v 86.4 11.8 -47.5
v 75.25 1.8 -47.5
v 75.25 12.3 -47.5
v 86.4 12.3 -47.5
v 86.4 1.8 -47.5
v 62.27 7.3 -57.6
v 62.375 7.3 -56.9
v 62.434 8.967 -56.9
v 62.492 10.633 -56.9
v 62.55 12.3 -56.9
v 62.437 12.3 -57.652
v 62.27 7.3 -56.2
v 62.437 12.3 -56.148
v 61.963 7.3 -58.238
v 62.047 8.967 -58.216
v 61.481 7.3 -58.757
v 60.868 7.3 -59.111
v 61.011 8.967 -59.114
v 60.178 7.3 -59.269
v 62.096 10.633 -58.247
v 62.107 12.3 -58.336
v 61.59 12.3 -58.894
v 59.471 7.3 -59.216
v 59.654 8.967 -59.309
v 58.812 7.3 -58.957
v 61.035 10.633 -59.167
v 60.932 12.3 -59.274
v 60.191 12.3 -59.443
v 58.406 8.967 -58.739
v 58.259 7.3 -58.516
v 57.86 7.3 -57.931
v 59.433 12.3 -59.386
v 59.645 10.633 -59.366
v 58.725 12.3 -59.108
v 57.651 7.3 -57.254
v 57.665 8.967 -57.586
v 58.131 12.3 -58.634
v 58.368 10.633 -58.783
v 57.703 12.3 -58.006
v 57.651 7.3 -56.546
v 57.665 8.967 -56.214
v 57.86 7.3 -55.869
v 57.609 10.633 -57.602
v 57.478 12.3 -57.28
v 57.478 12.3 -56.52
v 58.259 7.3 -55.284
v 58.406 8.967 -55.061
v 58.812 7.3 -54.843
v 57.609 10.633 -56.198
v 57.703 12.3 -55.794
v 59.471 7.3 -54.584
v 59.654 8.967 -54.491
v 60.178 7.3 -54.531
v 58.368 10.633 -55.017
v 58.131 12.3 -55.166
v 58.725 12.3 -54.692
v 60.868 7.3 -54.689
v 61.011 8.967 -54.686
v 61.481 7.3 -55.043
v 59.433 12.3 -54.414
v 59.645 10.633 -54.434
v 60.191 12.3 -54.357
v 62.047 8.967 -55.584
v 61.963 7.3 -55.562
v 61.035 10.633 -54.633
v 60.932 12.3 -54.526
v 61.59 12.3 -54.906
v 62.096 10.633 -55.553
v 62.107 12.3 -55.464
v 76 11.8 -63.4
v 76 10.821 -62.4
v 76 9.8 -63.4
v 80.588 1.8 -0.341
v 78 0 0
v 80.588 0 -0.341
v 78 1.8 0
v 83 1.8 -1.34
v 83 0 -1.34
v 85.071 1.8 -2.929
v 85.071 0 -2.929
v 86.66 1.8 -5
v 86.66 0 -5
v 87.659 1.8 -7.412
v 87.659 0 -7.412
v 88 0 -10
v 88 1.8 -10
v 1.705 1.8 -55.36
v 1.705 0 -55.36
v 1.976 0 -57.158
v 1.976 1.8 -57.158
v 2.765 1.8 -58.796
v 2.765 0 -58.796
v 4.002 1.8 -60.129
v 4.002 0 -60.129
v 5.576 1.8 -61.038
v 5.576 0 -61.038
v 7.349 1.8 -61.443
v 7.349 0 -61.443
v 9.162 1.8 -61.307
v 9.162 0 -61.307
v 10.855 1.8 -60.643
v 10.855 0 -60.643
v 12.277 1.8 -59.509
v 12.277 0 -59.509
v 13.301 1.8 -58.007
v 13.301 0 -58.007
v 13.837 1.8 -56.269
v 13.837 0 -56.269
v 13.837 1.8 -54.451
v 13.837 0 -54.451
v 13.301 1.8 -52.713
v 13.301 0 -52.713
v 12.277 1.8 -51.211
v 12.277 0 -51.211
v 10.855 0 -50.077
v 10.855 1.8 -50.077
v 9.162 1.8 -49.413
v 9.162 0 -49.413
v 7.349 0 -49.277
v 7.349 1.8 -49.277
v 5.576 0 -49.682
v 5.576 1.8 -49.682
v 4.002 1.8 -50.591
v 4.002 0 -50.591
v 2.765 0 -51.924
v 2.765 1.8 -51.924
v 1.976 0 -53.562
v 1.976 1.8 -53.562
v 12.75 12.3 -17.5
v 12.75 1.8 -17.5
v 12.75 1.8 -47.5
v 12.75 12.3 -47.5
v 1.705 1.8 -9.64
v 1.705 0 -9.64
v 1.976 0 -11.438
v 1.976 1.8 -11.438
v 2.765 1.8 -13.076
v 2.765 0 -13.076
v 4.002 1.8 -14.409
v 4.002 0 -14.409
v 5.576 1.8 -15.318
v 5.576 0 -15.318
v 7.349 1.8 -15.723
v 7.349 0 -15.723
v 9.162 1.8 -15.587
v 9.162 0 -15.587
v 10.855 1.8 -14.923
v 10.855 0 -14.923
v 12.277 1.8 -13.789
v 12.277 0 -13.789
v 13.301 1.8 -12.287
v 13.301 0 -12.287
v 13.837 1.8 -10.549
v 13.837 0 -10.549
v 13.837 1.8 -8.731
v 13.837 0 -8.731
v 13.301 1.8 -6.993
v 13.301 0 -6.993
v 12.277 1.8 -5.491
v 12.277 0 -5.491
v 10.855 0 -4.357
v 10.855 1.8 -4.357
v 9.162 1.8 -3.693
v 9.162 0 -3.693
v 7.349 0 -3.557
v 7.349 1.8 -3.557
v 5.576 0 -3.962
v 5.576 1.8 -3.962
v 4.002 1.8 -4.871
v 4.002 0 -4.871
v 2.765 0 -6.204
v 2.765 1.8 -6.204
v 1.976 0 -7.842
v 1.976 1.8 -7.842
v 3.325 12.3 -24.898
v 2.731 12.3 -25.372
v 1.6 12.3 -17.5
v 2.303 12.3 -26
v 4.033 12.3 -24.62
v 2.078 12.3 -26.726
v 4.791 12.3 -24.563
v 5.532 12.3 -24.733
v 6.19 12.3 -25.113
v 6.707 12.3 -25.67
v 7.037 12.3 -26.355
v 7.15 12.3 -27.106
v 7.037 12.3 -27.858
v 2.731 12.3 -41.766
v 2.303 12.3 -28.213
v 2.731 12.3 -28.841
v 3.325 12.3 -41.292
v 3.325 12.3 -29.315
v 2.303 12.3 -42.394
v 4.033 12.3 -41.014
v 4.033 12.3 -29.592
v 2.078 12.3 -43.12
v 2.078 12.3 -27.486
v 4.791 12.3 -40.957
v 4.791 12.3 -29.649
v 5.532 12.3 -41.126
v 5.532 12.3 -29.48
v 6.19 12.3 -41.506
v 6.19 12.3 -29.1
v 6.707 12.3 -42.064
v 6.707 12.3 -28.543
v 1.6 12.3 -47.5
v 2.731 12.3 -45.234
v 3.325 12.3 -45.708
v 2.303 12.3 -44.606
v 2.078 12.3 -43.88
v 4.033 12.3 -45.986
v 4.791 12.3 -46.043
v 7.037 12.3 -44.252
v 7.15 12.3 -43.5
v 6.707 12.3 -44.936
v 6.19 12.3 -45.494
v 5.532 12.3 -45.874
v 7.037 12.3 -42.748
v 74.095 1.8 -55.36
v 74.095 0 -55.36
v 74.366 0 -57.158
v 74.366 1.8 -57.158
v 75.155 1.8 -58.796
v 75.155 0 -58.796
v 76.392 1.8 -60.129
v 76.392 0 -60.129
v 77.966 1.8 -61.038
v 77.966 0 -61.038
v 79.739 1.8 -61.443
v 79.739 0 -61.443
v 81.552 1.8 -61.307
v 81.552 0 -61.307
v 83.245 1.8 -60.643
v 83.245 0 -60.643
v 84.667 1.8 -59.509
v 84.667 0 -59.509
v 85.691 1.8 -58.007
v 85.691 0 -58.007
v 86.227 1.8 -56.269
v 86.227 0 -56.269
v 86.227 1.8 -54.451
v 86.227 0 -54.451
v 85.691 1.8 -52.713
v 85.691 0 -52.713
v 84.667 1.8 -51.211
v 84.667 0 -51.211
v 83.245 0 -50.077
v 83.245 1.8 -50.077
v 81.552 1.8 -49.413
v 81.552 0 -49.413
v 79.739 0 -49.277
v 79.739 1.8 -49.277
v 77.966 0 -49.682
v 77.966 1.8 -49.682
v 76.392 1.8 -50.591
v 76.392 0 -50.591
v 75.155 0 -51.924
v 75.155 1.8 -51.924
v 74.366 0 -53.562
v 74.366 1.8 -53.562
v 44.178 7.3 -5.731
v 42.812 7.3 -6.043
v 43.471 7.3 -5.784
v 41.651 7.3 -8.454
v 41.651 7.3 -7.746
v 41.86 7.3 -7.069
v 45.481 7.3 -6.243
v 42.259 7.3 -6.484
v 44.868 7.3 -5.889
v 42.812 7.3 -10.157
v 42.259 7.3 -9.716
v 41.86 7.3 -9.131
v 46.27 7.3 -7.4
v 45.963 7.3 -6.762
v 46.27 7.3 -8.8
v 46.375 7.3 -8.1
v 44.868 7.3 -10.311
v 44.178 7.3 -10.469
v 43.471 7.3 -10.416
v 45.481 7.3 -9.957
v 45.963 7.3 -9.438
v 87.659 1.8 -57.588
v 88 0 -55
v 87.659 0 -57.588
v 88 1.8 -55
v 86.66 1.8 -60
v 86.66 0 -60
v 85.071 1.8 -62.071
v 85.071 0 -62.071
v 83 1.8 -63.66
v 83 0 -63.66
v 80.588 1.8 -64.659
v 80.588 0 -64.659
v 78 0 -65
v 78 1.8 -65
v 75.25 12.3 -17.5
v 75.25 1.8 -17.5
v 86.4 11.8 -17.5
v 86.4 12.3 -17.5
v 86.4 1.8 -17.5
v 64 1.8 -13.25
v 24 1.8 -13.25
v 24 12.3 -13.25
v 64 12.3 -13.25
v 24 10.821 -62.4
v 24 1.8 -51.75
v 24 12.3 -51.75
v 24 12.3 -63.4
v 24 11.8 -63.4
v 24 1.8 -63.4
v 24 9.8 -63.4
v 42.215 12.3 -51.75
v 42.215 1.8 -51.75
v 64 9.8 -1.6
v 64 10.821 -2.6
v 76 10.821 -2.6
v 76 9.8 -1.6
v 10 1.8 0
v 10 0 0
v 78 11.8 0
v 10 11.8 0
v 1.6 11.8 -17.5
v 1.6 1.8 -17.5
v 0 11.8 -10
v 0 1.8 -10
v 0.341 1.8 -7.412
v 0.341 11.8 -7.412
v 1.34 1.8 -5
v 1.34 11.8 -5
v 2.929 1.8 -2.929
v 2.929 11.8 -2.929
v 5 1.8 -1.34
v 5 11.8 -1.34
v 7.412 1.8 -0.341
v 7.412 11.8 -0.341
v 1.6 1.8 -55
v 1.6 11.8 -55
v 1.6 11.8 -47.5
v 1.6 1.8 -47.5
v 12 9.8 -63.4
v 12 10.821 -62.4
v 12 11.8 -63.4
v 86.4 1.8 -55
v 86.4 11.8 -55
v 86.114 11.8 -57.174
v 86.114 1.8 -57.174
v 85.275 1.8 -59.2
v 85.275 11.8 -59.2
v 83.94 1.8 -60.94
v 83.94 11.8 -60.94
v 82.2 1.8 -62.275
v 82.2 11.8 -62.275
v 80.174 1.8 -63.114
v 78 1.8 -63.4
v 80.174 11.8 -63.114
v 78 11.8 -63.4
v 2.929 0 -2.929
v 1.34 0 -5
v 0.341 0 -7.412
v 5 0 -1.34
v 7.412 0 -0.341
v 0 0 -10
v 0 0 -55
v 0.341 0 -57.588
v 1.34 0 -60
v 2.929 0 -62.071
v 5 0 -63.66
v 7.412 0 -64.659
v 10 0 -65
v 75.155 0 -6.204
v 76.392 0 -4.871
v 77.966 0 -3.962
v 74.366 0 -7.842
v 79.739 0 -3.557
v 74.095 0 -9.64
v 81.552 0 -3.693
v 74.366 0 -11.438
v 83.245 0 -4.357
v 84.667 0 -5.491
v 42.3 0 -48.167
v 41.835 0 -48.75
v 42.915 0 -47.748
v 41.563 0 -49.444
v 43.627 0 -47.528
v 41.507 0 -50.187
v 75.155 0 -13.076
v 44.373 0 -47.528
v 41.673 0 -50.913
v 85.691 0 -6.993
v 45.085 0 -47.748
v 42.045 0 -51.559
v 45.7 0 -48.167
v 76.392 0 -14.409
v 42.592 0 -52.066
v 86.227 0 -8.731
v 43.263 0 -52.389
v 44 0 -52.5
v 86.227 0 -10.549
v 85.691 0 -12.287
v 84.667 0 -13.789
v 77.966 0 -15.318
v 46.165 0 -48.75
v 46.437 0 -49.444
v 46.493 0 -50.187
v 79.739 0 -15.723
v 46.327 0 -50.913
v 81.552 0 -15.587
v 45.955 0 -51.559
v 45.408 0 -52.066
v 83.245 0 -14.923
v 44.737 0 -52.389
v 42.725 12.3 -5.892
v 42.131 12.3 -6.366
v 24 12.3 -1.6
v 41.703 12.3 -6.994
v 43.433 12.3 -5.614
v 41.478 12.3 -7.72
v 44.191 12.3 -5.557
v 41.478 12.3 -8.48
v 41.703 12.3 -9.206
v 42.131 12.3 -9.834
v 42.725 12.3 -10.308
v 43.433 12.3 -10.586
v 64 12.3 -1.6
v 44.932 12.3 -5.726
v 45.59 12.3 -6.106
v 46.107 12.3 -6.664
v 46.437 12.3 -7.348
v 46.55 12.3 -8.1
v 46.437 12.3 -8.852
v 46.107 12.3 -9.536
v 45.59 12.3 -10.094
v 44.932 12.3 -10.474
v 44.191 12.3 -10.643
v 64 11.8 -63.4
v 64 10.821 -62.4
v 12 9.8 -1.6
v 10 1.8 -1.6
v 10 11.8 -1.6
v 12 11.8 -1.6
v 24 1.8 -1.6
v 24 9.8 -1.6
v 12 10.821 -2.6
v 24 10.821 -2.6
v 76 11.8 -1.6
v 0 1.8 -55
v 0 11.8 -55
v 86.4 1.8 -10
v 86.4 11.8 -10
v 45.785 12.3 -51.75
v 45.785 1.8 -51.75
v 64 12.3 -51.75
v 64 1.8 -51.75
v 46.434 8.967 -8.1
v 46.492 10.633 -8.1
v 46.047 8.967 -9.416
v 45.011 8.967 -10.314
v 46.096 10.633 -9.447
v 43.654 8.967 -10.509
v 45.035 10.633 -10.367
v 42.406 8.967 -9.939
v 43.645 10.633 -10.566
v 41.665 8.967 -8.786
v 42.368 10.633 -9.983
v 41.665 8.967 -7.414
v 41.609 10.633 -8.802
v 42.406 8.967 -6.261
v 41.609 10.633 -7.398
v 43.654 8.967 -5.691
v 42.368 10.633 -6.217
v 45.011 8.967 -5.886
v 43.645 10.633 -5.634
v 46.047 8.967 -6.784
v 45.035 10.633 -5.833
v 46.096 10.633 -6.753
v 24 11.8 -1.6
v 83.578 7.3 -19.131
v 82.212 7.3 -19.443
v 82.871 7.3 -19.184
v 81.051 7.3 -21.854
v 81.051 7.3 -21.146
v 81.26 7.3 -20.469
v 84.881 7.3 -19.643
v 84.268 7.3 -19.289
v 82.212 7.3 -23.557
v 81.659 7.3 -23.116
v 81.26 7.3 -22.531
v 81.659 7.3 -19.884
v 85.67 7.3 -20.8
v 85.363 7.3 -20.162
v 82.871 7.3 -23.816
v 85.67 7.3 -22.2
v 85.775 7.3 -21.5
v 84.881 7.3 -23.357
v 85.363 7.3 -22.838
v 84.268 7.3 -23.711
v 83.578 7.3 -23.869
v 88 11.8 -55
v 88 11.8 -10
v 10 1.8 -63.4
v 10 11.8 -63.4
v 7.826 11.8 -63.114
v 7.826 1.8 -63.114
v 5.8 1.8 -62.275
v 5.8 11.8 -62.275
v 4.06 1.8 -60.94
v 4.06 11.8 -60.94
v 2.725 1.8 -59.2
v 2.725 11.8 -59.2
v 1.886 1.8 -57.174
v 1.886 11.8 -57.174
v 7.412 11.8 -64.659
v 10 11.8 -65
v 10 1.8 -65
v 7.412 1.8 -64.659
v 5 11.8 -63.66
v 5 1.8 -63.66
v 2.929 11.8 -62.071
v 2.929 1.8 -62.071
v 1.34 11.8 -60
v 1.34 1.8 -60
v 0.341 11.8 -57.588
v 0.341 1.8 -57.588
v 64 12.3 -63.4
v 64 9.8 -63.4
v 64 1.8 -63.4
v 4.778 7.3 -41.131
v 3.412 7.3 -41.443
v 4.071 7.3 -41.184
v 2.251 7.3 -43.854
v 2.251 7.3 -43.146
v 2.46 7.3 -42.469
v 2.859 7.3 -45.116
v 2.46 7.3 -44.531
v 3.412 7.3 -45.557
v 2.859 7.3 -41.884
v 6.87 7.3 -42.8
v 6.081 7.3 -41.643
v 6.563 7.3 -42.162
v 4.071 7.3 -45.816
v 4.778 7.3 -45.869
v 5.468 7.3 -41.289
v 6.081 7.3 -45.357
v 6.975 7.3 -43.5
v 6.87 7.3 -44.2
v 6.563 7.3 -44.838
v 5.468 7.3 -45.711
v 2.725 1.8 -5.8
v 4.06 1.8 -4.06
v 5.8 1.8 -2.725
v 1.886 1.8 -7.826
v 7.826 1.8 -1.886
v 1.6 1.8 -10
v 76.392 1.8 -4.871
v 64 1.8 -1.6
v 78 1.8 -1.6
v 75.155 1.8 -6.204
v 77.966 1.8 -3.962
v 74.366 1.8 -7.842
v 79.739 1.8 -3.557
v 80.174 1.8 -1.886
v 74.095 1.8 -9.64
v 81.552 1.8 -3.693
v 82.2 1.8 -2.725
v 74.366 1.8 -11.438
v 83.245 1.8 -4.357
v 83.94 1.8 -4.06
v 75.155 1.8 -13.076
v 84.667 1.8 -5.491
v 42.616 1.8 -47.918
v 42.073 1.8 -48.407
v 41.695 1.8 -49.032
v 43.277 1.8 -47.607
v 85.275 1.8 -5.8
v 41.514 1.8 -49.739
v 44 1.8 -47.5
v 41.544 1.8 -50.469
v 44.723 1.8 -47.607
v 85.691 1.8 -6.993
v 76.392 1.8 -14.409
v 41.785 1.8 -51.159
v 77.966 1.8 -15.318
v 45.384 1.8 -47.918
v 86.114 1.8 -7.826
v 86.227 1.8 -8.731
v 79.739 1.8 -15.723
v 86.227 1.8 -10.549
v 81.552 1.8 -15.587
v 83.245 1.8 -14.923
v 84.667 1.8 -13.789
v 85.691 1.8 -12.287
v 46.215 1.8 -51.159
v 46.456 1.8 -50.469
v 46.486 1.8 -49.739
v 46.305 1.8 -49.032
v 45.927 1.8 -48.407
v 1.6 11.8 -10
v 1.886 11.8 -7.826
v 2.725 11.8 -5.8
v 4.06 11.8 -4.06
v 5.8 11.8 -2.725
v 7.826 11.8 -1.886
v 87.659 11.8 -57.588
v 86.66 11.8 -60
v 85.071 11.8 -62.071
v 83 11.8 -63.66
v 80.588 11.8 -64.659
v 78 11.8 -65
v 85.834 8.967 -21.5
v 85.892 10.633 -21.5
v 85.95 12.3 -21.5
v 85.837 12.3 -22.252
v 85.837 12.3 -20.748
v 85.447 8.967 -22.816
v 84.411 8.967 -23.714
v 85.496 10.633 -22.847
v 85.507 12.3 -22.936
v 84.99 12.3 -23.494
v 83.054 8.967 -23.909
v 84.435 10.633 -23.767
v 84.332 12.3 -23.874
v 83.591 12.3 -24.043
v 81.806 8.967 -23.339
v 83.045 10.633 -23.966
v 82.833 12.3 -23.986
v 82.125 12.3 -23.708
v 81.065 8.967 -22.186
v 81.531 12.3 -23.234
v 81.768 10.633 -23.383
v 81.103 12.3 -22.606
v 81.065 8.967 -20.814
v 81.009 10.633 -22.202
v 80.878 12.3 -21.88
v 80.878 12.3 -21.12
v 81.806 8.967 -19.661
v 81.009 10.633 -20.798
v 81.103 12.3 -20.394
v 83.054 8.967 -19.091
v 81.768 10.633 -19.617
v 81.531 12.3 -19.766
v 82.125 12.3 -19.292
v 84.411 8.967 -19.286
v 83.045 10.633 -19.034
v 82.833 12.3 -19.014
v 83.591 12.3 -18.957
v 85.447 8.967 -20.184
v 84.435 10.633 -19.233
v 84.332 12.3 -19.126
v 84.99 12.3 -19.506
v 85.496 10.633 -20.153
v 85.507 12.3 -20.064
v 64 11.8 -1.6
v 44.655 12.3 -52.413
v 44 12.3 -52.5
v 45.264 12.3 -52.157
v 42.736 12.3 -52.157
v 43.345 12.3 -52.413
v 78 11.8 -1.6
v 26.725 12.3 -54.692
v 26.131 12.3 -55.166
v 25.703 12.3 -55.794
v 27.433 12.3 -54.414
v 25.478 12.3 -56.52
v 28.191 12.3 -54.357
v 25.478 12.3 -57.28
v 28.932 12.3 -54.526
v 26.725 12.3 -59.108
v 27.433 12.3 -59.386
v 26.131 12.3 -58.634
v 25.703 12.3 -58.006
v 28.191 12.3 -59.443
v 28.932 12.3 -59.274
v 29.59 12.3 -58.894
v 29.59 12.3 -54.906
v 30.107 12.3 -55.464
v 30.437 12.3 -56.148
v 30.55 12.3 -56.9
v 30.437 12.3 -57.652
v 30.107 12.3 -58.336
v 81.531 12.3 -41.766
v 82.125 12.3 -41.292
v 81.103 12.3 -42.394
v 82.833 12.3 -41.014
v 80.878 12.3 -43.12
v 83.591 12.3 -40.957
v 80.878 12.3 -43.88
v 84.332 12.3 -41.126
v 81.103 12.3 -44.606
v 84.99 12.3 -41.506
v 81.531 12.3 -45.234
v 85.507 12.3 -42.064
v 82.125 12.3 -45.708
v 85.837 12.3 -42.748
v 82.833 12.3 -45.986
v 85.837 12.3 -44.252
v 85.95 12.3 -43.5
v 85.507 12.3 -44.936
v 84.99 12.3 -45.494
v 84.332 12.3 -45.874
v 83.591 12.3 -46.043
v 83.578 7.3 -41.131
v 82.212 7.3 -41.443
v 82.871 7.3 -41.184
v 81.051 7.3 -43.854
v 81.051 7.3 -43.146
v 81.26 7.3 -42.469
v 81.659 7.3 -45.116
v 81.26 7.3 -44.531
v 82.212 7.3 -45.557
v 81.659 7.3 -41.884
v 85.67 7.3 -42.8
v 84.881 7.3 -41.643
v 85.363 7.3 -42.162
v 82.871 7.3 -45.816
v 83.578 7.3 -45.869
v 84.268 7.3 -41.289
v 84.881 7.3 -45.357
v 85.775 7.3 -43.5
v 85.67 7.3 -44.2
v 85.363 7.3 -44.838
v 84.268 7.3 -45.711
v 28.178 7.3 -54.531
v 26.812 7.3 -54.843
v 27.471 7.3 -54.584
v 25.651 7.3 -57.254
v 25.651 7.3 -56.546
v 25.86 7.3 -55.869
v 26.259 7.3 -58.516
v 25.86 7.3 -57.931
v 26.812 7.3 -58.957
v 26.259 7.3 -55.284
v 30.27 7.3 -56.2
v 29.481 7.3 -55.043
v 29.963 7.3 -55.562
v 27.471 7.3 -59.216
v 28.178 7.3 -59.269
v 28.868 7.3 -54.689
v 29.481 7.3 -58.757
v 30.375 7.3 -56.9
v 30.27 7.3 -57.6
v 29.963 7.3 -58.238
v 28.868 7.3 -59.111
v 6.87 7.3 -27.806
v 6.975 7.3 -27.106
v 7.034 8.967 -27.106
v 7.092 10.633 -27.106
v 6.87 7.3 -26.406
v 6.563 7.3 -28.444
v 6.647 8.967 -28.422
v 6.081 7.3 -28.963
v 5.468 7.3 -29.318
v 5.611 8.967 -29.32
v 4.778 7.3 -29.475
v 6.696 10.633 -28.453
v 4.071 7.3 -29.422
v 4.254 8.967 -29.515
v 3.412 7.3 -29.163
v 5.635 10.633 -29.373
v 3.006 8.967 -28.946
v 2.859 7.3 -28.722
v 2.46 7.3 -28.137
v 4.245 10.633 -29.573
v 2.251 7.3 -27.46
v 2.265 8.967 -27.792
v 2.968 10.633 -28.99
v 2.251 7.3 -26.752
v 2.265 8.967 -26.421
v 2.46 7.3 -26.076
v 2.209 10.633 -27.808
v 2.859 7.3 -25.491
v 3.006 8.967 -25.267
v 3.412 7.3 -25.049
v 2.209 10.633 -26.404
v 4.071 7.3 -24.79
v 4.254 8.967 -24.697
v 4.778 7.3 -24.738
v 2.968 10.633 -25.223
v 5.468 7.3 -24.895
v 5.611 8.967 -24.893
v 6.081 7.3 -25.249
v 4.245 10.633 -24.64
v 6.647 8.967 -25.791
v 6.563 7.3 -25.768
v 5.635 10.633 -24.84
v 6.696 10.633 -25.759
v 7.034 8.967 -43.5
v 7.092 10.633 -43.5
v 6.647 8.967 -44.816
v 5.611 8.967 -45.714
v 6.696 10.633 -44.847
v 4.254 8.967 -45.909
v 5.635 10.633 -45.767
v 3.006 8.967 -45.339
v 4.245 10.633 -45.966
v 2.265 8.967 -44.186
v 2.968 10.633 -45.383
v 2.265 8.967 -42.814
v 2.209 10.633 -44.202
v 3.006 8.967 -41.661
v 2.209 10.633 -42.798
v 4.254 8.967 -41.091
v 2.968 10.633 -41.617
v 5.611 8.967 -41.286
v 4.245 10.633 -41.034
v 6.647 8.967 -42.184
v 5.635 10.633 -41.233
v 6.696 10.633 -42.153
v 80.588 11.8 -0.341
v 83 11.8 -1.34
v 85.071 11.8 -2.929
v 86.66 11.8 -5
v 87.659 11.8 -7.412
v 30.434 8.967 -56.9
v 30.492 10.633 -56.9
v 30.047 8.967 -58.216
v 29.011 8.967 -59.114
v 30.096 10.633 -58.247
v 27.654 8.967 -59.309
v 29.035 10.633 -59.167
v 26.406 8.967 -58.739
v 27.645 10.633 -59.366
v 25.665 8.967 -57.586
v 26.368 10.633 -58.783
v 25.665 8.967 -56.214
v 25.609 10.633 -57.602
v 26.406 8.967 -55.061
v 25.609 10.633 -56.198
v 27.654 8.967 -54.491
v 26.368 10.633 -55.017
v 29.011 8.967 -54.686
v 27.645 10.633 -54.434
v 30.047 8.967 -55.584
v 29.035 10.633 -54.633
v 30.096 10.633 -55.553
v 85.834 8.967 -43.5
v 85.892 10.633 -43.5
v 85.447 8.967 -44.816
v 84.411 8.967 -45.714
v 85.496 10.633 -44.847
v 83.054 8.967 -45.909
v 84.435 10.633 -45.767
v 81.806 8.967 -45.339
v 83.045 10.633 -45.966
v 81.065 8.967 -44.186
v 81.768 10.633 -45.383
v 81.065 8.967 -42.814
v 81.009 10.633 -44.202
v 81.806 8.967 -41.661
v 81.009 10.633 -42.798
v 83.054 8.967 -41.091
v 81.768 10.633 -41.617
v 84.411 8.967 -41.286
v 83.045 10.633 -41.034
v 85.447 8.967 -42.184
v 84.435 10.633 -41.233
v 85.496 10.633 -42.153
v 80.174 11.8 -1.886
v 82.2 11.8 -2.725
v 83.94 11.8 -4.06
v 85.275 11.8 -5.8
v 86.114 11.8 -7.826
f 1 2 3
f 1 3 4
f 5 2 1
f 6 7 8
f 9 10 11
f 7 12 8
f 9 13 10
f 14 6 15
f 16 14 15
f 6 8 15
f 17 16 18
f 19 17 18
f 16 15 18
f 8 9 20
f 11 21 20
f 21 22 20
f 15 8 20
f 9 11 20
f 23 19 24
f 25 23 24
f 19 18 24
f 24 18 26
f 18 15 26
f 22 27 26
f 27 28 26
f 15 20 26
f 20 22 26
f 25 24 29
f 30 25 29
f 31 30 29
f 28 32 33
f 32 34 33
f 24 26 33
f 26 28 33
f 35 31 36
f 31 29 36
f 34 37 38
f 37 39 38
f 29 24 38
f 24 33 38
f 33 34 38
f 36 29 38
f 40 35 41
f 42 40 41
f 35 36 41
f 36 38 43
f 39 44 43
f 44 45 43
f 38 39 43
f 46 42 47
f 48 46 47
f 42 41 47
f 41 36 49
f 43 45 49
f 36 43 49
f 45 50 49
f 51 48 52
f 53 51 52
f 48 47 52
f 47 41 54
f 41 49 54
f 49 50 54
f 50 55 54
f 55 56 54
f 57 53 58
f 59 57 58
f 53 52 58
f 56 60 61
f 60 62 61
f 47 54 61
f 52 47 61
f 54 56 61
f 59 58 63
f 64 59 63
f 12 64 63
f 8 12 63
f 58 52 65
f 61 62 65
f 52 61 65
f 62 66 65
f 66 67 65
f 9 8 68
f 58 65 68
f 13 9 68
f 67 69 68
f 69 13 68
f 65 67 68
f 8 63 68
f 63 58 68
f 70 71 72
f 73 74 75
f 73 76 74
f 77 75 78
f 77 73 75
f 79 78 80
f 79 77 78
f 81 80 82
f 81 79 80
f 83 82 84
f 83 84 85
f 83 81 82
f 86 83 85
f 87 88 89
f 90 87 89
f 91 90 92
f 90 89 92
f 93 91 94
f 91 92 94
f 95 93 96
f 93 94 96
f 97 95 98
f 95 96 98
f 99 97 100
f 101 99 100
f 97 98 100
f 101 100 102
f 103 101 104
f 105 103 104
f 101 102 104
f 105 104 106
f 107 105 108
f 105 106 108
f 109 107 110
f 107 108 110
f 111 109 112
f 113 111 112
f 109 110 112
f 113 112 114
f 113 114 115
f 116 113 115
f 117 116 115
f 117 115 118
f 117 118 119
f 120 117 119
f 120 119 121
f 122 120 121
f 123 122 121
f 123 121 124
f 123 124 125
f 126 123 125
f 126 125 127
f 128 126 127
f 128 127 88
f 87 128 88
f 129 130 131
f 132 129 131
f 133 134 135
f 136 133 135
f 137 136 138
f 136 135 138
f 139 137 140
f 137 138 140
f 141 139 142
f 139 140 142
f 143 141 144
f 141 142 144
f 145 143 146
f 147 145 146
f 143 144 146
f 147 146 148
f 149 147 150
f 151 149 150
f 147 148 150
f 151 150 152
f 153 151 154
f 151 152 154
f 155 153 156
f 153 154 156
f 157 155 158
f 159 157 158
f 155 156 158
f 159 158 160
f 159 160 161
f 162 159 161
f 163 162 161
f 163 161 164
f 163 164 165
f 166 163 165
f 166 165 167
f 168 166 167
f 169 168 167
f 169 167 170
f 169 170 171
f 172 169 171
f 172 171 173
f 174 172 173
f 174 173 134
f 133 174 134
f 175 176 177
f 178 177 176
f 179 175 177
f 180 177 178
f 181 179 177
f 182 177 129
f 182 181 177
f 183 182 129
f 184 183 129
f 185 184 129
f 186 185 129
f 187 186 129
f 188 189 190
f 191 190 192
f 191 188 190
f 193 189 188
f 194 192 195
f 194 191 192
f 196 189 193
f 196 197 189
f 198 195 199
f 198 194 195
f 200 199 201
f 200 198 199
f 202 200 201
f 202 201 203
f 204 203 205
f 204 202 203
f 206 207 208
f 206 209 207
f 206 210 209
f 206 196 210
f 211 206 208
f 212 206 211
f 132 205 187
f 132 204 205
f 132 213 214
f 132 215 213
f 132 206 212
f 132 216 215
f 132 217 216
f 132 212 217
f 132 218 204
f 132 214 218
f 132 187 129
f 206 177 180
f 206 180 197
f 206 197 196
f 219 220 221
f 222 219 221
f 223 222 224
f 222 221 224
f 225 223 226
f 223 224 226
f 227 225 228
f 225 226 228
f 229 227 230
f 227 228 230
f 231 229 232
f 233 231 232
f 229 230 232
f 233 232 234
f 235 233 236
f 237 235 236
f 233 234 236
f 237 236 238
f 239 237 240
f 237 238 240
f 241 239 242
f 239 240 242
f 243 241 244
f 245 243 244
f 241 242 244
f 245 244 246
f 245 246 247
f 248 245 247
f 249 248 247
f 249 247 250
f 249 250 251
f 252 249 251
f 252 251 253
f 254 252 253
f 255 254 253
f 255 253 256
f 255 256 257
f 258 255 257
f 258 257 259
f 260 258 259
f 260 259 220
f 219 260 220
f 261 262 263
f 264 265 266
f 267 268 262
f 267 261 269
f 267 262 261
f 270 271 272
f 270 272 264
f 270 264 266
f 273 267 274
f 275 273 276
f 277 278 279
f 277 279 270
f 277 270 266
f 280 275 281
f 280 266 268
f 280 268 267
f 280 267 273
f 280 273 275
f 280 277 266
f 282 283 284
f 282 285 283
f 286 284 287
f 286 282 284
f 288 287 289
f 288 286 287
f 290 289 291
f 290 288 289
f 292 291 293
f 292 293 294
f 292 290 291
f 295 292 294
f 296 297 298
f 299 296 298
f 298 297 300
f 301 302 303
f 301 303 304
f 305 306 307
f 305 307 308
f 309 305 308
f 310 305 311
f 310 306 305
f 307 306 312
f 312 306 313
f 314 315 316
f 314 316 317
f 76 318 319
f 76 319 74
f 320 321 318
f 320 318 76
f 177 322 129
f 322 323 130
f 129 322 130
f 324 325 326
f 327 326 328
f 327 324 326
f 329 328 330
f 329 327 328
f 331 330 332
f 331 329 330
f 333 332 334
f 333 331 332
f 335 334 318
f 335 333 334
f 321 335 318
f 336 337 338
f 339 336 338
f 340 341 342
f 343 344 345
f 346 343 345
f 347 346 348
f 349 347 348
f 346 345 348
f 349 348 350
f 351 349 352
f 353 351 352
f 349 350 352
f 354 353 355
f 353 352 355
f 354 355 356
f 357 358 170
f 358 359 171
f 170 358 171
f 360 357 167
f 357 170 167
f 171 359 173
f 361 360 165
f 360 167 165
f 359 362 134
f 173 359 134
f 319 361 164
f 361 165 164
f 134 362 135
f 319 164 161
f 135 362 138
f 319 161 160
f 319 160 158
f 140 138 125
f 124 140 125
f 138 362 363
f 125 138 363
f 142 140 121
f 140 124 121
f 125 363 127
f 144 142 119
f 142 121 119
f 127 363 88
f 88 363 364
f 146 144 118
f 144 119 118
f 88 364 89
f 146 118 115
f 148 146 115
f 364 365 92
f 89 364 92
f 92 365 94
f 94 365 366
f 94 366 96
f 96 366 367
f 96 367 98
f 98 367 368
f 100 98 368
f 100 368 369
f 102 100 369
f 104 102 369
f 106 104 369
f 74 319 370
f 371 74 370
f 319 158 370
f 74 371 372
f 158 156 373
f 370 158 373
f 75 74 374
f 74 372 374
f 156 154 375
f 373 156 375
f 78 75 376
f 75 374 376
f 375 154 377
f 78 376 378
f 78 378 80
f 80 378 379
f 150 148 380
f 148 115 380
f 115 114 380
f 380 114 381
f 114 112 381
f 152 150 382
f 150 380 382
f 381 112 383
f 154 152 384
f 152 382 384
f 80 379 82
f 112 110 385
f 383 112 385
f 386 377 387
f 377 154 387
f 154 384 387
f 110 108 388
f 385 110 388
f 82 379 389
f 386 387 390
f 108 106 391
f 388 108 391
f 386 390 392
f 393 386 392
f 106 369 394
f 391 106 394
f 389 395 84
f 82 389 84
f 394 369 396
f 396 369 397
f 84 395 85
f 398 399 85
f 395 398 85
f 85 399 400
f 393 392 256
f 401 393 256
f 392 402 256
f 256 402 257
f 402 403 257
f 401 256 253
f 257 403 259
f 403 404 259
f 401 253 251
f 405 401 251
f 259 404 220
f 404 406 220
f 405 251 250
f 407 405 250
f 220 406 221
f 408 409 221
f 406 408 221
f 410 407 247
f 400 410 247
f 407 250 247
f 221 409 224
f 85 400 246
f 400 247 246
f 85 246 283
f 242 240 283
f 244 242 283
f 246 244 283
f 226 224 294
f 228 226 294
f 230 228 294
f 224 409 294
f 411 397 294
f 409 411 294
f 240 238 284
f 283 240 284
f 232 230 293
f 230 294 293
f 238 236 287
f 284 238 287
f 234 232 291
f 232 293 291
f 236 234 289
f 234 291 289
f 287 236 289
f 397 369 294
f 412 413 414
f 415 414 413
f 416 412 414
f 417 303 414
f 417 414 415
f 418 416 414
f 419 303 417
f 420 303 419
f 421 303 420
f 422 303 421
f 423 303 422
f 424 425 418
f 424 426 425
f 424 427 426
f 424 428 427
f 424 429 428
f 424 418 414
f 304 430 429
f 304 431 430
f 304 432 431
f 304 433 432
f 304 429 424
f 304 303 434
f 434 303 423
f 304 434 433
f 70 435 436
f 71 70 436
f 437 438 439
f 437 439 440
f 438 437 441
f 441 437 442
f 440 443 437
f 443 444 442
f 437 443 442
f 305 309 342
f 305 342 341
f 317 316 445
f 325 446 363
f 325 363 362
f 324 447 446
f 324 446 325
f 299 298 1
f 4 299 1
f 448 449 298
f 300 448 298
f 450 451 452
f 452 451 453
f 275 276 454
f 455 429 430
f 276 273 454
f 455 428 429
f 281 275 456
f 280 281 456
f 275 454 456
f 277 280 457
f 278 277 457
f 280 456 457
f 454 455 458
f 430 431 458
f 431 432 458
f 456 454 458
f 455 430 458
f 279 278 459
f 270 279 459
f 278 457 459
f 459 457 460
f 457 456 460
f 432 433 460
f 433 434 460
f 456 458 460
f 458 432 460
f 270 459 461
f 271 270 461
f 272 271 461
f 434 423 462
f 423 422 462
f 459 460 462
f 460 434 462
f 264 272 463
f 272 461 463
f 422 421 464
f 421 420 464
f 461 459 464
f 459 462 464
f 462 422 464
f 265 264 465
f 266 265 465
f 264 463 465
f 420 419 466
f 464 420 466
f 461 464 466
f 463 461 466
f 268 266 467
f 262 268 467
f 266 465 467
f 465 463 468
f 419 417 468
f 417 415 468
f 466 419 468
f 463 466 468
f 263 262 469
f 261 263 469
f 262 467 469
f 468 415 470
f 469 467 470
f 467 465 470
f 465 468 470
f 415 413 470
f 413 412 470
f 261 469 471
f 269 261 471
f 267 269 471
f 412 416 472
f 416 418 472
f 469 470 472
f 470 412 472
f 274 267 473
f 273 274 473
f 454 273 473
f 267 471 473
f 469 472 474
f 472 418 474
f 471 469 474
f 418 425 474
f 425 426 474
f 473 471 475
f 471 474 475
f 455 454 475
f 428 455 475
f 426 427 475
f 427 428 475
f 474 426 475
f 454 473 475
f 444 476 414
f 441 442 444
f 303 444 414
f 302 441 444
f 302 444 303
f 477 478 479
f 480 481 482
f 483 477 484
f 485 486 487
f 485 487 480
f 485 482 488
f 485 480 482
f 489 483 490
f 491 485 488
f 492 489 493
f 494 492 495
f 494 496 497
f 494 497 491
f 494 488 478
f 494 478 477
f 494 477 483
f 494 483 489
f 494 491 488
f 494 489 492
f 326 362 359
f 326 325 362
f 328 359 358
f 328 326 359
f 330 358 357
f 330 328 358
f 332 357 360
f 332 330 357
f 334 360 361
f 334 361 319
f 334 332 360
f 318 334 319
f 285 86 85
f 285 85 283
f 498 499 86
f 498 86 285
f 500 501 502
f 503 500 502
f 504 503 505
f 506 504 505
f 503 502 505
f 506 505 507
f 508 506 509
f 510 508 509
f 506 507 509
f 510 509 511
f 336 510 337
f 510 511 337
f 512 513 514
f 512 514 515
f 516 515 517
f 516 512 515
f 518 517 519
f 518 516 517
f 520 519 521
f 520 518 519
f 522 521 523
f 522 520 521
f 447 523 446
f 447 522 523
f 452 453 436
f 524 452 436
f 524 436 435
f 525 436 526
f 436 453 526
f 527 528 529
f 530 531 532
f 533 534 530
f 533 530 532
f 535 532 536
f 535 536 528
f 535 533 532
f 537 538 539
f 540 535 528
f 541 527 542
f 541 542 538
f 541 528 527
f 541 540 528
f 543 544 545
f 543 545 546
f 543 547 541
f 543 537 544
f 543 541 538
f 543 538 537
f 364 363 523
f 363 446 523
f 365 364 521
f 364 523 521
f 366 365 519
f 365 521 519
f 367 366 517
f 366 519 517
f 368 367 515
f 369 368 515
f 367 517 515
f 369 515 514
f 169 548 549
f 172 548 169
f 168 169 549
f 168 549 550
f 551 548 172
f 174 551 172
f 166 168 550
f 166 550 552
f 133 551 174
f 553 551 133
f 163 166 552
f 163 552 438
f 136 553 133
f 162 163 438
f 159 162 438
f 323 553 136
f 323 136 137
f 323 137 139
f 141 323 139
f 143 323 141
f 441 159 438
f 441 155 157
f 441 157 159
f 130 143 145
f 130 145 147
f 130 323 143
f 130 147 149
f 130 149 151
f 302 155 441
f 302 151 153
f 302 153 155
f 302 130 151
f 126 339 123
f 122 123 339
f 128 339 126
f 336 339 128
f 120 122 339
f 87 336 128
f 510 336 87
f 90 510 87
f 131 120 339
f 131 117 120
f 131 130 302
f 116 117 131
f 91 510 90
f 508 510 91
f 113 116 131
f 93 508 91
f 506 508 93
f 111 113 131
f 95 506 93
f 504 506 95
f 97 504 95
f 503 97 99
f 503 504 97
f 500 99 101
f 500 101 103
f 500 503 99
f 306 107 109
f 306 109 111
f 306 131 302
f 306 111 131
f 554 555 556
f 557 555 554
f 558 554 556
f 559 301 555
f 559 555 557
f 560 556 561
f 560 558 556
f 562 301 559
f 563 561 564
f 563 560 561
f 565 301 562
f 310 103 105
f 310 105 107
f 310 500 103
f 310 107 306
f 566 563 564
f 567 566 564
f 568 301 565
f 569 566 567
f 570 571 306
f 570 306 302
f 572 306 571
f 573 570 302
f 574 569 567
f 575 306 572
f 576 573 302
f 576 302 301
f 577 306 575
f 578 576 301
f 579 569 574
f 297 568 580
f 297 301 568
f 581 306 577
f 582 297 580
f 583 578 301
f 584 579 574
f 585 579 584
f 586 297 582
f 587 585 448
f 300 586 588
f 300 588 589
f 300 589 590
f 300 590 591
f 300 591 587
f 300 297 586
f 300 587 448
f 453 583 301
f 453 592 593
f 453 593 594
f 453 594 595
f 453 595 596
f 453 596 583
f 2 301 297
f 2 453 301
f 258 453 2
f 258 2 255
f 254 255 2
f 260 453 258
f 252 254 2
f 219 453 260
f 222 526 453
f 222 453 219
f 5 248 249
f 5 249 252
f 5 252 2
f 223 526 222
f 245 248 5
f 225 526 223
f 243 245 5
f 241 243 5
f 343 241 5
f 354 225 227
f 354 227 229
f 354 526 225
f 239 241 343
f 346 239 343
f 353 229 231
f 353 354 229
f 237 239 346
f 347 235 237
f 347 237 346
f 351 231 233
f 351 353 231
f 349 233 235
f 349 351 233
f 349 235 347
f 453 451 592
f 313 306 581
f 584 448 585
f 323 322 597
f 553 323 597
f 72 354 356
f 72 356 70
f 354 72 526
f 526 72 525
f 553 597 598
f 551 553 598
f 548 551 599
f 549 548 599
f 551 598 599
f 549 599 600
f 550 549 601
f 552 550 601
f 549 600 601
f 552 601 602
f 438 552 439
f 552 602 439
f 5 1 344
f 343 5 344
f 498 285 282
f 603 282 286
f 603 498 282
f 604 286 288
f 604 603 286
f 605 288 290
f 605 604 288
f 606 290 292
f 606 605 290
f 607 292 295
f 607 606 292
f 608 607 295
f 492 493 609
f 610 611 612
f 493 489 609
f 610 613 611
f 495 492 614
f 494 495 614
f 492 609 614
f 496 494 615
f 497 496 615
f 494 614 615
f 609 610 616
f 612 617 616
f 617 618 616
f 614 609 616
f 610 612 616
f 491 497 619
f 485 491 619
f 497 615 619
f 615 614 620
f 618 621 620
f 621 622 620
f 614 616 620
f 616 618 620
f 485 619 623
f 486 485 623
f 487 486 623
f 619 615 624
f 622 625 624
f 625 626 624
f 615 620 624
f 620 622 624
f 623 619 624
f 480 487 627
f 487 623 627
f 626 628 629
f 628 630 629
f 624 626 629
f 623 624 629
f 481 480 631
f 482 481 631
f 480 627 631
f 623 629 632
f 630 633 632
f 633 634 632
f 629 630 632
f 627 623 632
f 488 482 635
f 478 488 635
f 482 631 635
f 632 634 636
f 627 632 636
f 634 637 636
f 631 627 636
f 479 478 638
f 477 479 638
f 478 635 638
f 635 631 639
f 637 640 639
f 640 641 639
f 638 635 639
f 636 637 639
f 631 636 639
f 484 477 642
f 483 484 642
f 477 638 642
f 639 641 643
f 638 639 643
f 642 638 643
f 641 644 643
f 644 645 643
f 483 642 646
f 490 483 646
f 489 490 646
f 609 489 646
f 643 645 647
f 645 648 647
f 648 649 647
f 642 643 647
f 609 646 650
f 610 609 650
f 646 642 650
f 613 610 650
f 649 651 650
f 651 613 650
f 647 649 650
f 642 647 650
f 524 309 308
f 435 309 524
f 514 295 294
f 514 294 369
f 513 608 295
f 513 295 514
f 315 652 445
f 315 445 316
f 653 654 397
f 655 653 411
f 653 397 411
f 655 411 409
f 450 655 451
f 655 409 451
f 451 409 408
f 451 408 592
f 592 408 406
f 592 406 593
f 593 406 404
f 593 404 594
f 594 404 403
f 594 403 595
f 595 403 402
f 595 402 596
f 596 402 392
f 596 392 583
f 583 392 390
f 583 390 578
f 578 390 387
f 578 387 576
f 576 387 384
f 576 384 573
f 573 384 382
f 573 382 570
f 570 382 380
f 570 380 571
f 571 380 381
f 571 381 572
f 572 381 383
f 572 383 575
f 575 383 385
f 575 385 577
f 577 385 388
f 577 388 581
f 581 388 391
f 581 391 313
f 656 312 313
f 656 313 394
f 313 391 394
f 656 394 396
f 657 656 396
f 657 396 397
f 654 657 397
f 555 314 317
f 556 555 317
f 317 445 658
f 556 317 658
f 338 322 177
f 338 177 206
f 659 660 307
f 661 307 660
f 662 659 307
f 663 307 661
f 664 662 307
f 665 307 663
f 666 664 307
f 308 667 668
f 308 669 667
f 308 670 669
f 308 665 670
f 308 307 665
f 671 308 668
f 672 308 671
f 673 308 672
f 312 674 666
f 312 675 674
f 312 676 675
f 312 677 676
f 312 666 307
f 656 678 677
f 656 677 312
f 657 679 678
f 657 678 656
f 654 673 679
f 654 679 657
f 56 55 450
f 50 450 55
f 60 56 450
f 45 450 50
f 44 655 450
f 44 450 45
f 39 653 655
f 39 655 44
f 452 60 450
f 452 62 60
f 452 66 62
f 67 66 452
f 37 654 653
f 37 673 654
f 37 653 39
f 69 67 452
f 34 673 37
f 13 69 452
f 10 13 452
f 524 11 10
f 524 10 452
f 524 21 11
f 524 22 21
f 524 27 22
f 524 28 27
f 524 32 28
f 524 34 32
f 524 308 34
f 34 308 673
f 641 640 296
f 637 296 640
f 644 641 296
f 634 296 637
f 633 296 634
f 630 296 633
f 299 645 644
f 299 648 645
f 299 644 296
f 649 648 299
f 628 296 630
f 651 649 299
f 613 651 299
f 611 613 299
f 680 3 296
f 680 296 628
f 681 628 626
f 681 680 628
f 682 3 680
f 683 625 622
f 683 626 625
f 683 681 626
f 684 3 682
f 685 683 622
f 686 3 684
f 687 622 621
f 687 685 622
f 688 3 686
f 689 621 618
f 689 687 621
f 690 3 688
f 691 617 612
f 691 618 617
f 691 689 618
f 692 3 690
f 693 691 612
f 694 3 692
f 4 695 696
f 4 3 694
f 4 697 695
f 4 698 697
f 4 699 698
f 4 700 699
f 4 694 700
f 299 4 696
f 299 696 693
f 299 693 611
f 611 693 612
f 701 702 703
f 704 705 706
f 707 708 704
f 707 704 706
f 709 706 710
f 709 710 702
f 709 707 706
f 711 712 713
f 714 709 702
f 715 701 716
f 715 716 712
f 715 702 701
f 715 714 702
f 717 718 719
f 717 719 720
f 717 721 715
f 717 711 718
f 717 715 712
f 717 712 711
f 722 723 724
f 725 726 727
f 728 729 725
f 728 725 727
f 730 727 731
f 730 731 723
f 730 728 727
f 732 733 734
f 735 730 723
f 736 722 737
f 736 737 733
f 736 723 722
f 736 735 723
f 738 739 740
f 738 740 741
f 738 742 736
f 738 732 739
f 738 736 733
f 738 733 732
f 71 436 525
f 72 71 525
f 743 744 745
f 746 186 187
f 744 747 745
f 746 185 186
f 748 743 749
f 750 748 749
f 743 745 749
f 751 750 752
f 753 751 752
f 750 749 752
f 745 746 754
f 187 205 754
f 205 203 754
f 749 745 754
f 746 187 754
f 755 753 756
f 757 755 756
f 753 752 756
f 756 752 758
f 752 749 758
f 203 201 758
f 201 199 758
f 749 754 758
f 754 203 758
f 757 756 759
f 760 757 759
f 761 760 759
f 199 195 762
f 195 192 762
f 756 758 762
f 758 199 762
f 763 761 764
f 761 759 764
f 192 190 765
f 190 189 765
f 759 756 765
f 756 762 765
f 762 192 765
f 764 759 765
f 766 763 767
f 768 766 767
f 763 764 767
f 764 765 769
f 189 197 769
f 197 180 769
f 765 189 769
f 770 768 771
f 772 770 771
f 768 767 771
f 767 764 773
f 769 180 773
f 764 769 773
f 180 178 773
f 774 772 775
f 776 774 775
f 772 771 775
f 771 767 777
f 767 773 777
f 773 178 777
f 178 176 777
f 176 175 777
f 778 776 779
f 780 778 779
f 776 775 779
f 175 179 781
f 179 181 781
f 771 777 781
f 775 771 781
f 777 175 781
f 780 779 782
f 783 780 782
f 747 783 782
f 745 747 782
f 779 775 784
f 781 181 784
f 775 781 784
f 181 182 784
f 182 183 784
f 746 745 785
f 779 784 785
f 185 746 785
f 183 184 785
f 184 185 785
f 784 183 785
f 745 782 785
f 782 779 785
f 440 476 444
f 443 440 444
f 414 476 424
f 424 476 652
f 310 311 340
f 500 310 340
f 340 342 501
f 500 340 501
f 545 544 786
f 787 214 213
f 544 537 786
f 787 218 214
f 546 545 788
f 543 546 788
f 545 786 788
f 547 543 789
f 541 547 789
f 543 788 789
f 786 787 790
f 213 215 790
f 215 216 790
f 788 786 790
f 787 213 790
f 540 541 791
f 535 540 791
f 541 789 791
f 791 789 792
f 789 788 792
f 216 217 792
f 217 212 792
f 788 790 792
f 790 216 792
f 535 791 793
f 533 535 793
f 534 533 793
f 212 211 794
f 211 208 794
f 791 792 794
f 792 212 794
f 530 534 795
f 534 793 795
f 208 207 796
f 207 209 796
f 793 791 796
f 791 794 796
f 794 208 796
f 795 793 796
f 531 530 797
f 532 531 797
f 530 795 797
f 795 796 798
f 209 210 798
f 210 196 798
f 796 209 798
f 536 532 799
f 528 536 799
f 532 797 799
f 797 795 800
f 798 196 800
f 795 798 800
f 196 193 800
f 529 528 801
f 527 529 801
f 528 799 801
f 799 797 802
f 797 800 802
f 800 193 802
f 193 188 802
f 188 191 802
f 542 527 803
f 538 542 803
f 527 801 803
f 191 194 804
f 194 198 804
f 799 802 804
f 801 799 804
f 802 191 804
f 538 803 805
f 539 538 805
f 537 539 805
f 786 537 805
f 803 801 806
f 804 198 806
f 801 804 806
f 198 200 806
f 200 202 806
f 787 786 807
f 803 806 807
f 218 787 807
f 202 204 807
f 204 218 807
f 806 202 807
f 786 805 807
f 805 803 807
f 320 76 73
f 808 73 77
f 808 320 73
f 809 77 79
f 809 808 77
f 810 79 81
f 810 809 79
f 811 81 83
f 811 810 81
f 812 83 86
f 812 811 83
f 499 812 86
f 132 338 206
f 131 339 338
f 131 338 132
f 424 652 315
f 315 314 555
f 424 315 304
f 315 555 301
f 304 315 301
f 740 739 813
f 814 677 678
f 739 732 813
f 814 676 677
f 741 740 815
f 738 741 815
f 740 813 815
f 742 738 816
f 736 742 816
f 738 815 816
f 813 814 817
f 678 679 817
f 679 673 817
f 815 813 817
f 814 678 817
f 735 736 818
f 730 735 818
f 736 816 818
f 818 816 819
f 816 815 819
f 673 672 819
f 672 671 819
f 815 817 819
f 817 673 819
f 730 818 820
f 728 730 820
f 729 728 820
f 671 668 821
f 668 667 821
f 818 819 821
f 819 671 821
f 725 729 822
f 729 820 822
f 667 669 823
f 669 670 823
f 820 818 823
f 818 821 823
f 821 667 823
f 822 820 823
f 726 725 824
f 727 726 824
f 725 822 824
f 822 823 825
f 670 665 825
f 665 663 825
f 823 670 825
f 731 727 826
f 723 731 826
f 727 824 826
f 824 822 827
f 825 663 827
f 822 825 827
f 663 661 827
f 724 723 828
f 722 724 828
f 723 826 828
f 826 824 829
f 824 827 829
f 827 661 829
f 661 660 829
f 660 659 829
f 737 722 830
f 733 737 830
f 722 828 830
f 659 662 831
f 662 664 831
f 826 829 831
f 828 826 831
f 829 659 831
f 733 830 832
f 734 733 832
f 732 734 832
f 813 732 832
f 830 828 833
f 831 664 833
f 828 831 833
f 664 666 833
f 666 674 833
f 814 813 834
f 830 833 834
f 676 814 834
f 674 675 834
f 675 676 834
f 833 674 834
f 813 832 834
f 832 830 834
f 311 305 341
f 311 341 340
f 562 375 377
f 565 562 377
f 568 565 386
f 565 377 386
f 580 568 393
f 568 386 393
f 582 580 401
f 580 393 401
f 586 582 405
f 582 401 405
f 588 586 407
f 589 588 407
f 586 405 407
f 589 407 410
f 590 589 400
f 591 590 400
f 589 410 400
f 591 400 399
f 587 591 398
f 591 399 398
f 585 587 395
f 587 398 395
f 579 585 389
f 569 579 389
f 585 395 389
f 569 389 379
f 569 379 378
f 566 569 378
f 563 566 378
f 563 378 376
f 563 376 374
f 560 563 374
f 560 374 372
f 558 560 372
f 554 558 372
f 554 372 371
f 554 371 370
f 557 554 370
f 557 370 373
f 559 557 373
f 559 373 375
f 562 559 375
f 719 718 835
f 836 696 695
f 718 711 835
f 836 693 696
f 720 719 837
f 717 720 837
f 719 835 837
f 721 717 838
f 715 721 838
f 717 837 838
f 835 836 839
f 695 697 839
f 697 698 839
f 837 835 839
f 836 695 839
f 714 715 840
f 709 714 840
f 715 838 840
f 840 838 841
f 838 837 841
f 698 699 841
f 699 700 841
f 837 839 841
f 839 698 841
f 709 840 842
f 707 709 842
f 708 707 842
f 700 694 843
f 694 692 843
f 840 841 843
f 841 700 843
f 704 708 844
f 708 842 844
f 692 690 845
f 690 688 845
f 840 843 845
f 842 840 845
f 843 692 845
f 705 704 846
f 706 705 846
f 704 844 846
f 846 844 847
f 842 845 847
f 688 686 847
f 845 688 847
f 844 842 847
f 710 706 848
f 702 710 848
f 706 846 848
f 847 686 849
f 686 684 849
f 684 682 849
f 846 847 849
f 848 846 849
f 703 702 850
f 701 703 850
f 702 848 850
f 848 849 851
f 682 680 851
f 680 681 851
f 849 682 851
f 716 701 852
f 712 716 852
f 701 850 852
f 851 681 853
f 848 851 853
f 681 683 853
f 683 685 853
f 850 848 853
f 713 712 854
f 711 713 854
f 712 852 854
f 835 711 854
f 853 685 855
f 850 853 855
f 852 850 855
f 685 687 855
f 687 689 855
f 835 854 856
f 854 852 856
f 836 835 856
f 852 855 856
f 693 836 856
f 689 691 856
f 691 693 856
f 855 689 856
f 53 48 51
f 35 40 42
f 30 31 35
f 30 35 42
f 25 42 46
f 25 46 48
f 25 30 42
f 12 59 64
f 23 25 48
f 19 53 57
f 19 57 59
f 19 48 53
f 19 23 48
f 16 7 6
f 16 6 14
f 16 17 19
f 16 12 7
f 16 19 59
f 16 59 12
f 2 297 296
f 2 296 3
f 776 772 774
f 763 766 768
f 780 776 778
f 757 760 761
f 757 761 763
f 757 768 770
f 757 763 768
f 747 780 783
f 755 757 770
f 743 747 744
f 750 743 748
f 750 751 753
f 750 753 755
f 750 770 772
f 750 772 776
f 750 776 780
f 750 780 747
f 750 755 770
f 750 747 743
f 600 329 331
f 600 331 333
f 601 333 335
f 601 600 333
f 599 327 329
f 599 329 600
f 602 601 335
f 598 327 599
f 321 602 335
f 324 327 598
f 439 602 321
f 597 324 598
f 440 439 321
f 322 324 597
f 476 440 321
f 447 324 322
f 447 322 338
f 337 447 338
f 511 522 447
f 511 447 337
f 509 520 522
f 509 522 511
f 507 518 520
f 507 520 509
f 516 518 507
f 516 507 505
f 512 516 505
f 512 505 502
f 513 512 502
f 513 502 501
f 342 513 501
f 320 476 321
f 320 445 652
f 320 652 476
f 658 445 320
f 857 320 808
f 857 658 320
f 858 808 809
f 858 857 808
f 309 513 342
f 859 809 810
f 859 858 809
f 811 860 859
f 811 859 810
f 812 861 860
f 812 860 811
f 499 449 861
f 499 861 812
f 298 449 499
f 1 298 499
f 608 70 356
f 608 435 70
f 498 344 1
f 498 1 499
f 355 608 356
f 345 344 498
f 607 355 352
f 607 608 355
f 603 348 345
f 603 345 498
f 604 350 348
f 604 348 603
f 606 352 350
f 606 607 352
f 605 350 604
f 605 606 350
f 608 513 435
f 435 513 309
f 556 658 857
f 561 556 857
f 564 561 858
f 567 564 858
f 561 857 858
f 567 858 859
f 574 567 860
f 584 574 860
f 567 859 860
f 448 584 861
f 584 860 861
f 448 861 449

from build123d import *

# Parameters (mm, degrees)
SKETCH1_W                                = 88
SKETCH1_H                                = 65
BOSS_EXTRUDE2_DEPTH                      = 1.8
FILLET1_R                                = 10
F_12_2_12_2_DIAMETER_HOLE1_D             = 12.2
BOSS_EXTRUDE3_START                      = 10
BOSS_EXTRUDE3_DEPTH                      = 10
SKETCH5_W                                = 40
SKETCH5_H                                = 11.65
SKETCH5_W_2                              = 11.15
SKETCH5_H_2                              = 30
BOSS_EXTRUDE4_DEPTH                      = 10.5
SKETCH6_R                                = 2.55
CUT_EXTRUDE1_DEPTH                       = 5
CUT_EXTRUDE1_DRAFT                       = -2
CUT_EXTRUDE1_PROFILE_2_DEPTH             = 5
CUT_EXTRUDE1_PROFILE_2_DRAFT             = -2
CUT_EXTRUDE1_PROFILE_3_DEPTH             = 5
CUT_EXTRUDE1_PROFILE_3_DRAFT             = -2
CUT_EXTRUDE1_PROFILE_4_DEPTH             = 5
CUT_EXTRUDE1_PROFILE_4_DRAFT             = -2
CUT_EXTRUDE1_PROFILE_5_DEPTH             = 5
CUT_EXTRUDE1_PROFILE_5_DRAFT             = -2
CUT_EXTRUDE1_PROFILE_6_DEPTH             = 5
CUT_EXTRUDE1_PROFILE_6_DRAFT             = -2
CUT_EXTRUDE1_PROFILE_7_DEPTH             = 5
CUT_EXTRUDE1_PROFILE_7_DRAFT             = -2
SKETCH7_R                                = 2.5
CUT_EXTRUDE2_DEPTH                       = 111.092188642
BOSS_EXTRUDE5_DEPTH                      = 12
MIRROR1_AT_THE_SECOND_PLANE_COPY_1_DEPTH = 12


with BuildPart() as part:
    # Sketch1 → Boss-Extrude2 (new body)
    with BuildSketch(Plane(origin=(0, 0, 0), x_dir=(1, 0, 0), z_dir=(0, 1, 0))):
        with Locations((44, 32.5)):
            Rectangle(SKETCH1_W, SKETCH1_H)
    extrude(amount=BOSS_EXTRUDE2_DEPTH)

    # Fillet1
    fillet1_edges = [part.edges().sort_by_distance(p)[0] for p in [
        (0, 0.9, -65),
        (88, 0.9, -65),
        (88, 0.9, 0),
        (0, 0.9, 0),
    ]]
    fillet(fillet1_edges, radius=FILLET1_R)

    # Ø12.2 (12.2) Diameter Hole1 (through all)
    with Locations(Plane(origin=(0, 1.8, 0), x_dir=(1, 0, 0), z_dir=(0, 1, 0))):
        with Locations((7.805, 55.36), (80.195, 55.36), (7.805, 9.64), (80.195, 9.64)):
            Hole(F_12_2_12_2_DIAMETER_HOLE1_D / 2)

    # Sketch4 → Boss-Extrude3 (add)
    with BuildSketch(Plane(origin=(0, 1.8, 0), x_dir=(1, 0, 0), z_dir=(0, 1, 0)).offset(BOSS_EXTRUDE3_START)):
        with BuildLine():
            Line((78, 65), (10, 65))
            ThreePointArc((10, 65), (2.928932188, 62.071067812), (0, 55))
            Line((0, 55), (0, 10))
            ThreePointArc((0, 10), (2.928932188, 2.928932188), (10, 0))
            Line((10, 0), (78, 0))
            ThreePointArc((78, 0), (85.071067812, 2.928932188), (88, 10))
            Line((88, 10), (88, 55))
            ThreePointArc((88, 55), (85.071067812, 62.071067812), (78, 65))
        make_face()
        with BuildLine():
            Line((78, 63.4), (10, 63.4))
            ThreePointArc((10, 63.4), (4.060303038, 60.939696962), (1.6, 55))
            Line((1.6, 55), (1.6, 10))
            ThreePointArc((1.6, 10), (4.060303038, 4.060303038), (10, 1.6))
            Line((10, 1.6), (78, 1.6))
            ThreePointArc((78, 1.6), (83.939696962, 4.060303038), (86.4, 10))
            Line((86.4, 10), (86.4, 55))
            ThreePointArc((86.4, 55), (83.939696962, 60.939696962), (78, 63.4))
        make_face(mode=Mode.SUBTRACT)
    extrude(amount=-BOSS_EXTRUDE3_DEPTH)

    # Sketch5 → Boss-Extrude4 (add)
    with BuildSketch(Plane(origin=(0, 1.8, 0), x_dir=(1, 0, 0), z_dir=(0, 1, 0))):
        with Locations((44, 57.575)):
            Rectangle(SKETCH5_W, SKETCH5_H)
        with Locations((44, 7.425)):
            Rectangle(SKETCH5_W, SKETCH5_H)
        with Locations((80.825, 32.5)):
            Rectangle(SKETCH5_W_2, SKETCH5_H_2)
        with Locations((7.175, 32.5)):
            Rectangle(SKETCH5_W_2, SKETCH5_H_2)
    extrude(amount=BOSS_EXTRUDE4_DEPTH)


with BuildPart() as cut_extrude1_tool:
    # Sketch6 → Cut-Extrude1 (with draft: the straight prism first)
    with BuildSketch(Plane(origin=(0, 12.3, 0), x_dir=(1, 0, 0), z_dir=(0, 1, 0))):
        with Locations((60, 56.9)):
            Circle(SKETCH6_R)
    extrude(amount=-CUT_EXTRUDE1_DEPTH)
    # Cut-Extrude1: the draft: its side faces are tilted about the plane it starts from
    cut_extrude1_sides = [cut_extrude1_tool.faces().sort_by_distance(p)[0] for p in [
        (57.45, 9.8, -56.9),
    ]]
    draft(cut_extrude1_sides, Plane(origin=(0, 12.3, 0), x_dir=(1, 0, 0), z_dir=(0, 1, 0)), CUT_EXTRUDE1_DRAFT)


with BuildPart() as part_1:
    add(part.part)

    # Cut-Extrude1: cut by cut_extrude1_tool
    add(cut_extrude1_tool.part, mode=Mode.SUBTRACT)


with BuildPart() as cut_extrude1_profile_2_tool:
    # Sketch6 → Cut-Extrude1 profile 2 (with draft: the straight prism first)
    with BuildSketch(Plane(origin=(0, 12.3, 0), x_dir=(1, 0, 0), z_dir=(0, 1, 0))):
        with Locations((28, 56.9)):
            Circle(SKETCH6_R)
    extrude(amount=-CUT_EXTRUDE1_PROFILE_2_DEPTH)
    # Cut-Extrude1 profile 2: the draft: its side faces are tilted about the plane it starts from
    cut_extrude1_profile_2_sides = [cut_extrude1_profile_2_tool.faces().sort_by_distance(p)[0] for p in [
        (25.45, 9.8, -56.9),
    ]]
    draft(cut_extrude1_profile_2_sides, Plane(origin=(0, 12.3, 0), x_dir=(1, 0, 0), z_dir=(0, 1, 0)), CUT_EXTRUDE1_PROFILE_2_DRAFT)


with BuildPart() as part_2:
    add(part_1.part)

    # Cut-Extrude1 profile 2: cut by cut_extrude1_profile_2_tool
    add(cut_extrude1_profile_2_tool.part, mode=Mode.SUBTRACT)


with BuildPart() as cut_extrude1_profile_3_tool:
    # Sketch6 → Cut-Extrude1 profile 3 (with draft: the straight prism first)
    with BuildSketch(Plane(origin=(0, 12.3, 0), x_dir=(1, 0, 0), z_dir=(0, 1, 0))):
        with Locations((4.6, 43.5)):
            Circle(SKETCH6_R)
    extrude(amount=-CUT_EXTRUDE1_PROFILE_3_DEPTH)
    # Cut-Extrude1 profile 3: the draft: its side faces are tilted about the plane it starts from
    cut_extrude1_profile_3_sides = [cut_extrude1_profile_3_tool.faces().sort_by_distance(p)[0] for p in [
        (2.05, 9.8, -43.5),
    ]]
    draft(cut_extrude1_profile_3_sides, Plane(origin=(0, 12.3, 0), x_dir=(1, 0, 0), z_dir=(0, 1, 0)), CUT_EXTRUDE1_PROFILE_3_DRAFT)


with BuildPart() as part_3:
    add(part_2.part)

    # Cut-Extrude1 profile 3: cut by cut_extrude1_profile_3_tool
    add(cut_extrude1_profile_3_tool.part, mode=Mode.SUBTRACT)


with BuildPart() as cut_extrude1_profile_4_tool:
    # Sketch6 → Cut-Extrude1 profile 4 (with draft: the straight prism first)
    with BuildSketch(Plane(origin=(0, 12.3, 0), x_dir=(1, 0, 0), z_dir=(0, 1, 0))):
        with Locations((4.6, 27.106324955)):
            Circle(SKETCH6_R)
    extrude(amount=-CUT_EXTRUDE1_PROFILE_4_DEPTH)
    # Cut-Extrude1 profile 4: the draft: its side faces are tilted about the plane it starts from
    cut_extrude1_profile_4_sides = [cut_extrude1_profile_4_tool.faces().sort_by_distance(p)[0] for p in [
        (2.05, 9.8, -27.106324955),
    ]]
    draft(cut_extrude1_profile_4_sides, Plane(origin=(0, 12.3, 0), x_dir=(1, 0, 0), z_dir=(0, 1, 0)), CUT_EXTRUDE1_PROFILE_4_DRAFT)


with BuildPart() as part_4:
    add(part_3.part)

    # Cut-Extrude1 profile 4: cut by cut_extrude1_profile_4_tool
    add(cut_extrude1_profile_4_tool.part, mode=Mode.SUBTRACT)


with BuildPart() as cut_extrude1_profile_5_tool:
    # Sketch6 → Cut-Extrude1 profile 5 (with draft: the straight prism first)
    with BuildSketch(Plane(origin=(0, 12.3, 0), x_dir=(1, 0, 0), z_dir=(0, 1, 0))):
        with Locations((83.4, 21.5)):
            Circle(SKETCH6_R)
    extrude(amount=-CUT_EXTRUDE1_PROFILE_5_DEPTH)
    # Cut-Extrude1 profile 5: the draft: its side faces are tilted about the plane it starts from
    cut_extrude1_profile_5_sides = [cut_extrude1_profile_5_tool.faces().sort_by_distance(p)[0] for p in [
        (80.85, 9.8, -21.5),
    ]]
    draft(cut_extrude1_profile_5_sides, Plane(origin=(0, 12.3, 0), x_dir=(1, 0, 0), z_dir=(0, 1, 0)), CUT_EXTRUDE1_PROFILE_5_DRAFT)


with BuildPart() as part_5:
    add(part_4.part)

    # Cut-Extrude1 profile 5: cut by cut_extrude1_profile_5_tool
    add(cut_extrude1_profile_5_tool.part, mode=Mode.SUBTRACT)


with BuildPart() as cut_extrude1_profile_6_tool:
    # Sketch6 → Cut-Extrude1 profile 6 (with draft: the straight prism first)
    with BuildSketch(Plane(origin=(0, 12.3, 0), x_dir=(1, 0, 0), z_dir=(0, 1, 0))):
        with Locations((83.4, 43.5)):
            Circle(SKETCH6_R)
    extrude(amount=-CUT_EXTRUDE1_PROFILE_6_DEPTH)
    # Cut-Extrude1 profile 6: the draft: its side faces are tilted about the plane it starts from
    cut_extrude1_profile_6_sides = [cut_extrude1_profile_6_tool.faces().sort_by_distance(p)[0] for p in [
        (80.85, 9.8, -43.5),
    ]]
    draft(cut_extrude1_profile_6_sides, Plane(origin=(0, 12.3, 0), x_dir=(1, 0, 0), z_dir=(0, 1, 0)), CUT_EXTRUDE1_PROFILE_6_DRAFT)


with BuildPart() as part_6:
    add(part_5.part)

    # Cut-Extrude1 profile 6: cut by cut_extrude1_profile_6_tool
    add(cut_extrude1_profile_6_tool.part, mode=Mode.SUBTRACT)


with BuildPart() as cut_extrude1_profile_7_tool:
    # Sketch6 → Cut-Extrude1 profile 7 (with draft: the straight prism first)
    with BuildSketch(Plane(origin=(0, 12.3, 0), x_dir=(1, 0, 0), z_dir=(0, 1, 0))):
        with Locations((44, 8.1)):
            Circle(SKETCH6_R)
    extrude(amount=-CUT_EXTRUDE1_PROFILE_7_DEPTH)
    # Cut-Extrude1 profile 7: the draft: its side faces are tilted about the plane it starts from
    cut_extrude1_profile_7_sides = [cut_extrude1_profile_7_tool.faces().sort_by_distance(p)[0] for p in [
        (41.45, 9.8, -8.1),
    ]]
    draft(cut_extrude1_profile_7_sides, Plane(origin=(0, 12.3, 0), x_dir=(1, 0, 0), z_dir=(0, 1, 0)), CUT_EXTRUDE1_PROFILE_7_DRAFT)


with BuildPart() as part_7:
    add(part_6.part)

    # Cut-Extrude1 profile 7: cut by cut_extrude1_profile_7_tool
    add(cut_extrude1_profile_7_tool.part, mode=Mode.SUBTRACT)

    # Sketch7 → Cut-Extrude2 (cut, through all)
    with BuildSketch(Plane.XZ):
        with Locations(Location((44, -50, 0), (0, 0, 270))):
            Circle(SKETCH7_R)
    extrude(amount=-CUT_EXTRUDE2_DEPTH, mode=Mode.SUBTRACT)

    # Sketch8 → Boss-Extrude5 (add)
    with BuildSketch(Plane.ZY.offset(-24)):
        Polygon((-1.6, 9.799528107), (-1.6, 11.8), (-2.6, 10.821488431), align=None)
    boss_extrude5 = extrude(amount=BOSS_EXTRUDE5_DEPTH)

    # Mirror1: Boss-Extrude5 across plane
    add(boss_extrude5.mirror(Plane.XY.offset(-32.5)))

    # Mirror1 at the second plane: Boss-Extrude5 across plane
    add(boss_extrude5.mirror(Plane.ZY.offset(-44)))

    # Mirror1 at the second plane copy 1 sketc → Mirror1 at the second plane copy 1 (add)
    with BuildSketch(Plane(origin=(64, 0, -65), x_dir=(0, 0, -1), z_dir=(1, 0, 0))):
        Polygon((-1.6, 9.799528107), (-1.6, 11.8), (-2.6, 10.821488431), align=None)
    extrude(amount=MIRROR1_AT_THE_SECOND_PLANE_COPY_1_DEPTH)


solid = part_7.part
